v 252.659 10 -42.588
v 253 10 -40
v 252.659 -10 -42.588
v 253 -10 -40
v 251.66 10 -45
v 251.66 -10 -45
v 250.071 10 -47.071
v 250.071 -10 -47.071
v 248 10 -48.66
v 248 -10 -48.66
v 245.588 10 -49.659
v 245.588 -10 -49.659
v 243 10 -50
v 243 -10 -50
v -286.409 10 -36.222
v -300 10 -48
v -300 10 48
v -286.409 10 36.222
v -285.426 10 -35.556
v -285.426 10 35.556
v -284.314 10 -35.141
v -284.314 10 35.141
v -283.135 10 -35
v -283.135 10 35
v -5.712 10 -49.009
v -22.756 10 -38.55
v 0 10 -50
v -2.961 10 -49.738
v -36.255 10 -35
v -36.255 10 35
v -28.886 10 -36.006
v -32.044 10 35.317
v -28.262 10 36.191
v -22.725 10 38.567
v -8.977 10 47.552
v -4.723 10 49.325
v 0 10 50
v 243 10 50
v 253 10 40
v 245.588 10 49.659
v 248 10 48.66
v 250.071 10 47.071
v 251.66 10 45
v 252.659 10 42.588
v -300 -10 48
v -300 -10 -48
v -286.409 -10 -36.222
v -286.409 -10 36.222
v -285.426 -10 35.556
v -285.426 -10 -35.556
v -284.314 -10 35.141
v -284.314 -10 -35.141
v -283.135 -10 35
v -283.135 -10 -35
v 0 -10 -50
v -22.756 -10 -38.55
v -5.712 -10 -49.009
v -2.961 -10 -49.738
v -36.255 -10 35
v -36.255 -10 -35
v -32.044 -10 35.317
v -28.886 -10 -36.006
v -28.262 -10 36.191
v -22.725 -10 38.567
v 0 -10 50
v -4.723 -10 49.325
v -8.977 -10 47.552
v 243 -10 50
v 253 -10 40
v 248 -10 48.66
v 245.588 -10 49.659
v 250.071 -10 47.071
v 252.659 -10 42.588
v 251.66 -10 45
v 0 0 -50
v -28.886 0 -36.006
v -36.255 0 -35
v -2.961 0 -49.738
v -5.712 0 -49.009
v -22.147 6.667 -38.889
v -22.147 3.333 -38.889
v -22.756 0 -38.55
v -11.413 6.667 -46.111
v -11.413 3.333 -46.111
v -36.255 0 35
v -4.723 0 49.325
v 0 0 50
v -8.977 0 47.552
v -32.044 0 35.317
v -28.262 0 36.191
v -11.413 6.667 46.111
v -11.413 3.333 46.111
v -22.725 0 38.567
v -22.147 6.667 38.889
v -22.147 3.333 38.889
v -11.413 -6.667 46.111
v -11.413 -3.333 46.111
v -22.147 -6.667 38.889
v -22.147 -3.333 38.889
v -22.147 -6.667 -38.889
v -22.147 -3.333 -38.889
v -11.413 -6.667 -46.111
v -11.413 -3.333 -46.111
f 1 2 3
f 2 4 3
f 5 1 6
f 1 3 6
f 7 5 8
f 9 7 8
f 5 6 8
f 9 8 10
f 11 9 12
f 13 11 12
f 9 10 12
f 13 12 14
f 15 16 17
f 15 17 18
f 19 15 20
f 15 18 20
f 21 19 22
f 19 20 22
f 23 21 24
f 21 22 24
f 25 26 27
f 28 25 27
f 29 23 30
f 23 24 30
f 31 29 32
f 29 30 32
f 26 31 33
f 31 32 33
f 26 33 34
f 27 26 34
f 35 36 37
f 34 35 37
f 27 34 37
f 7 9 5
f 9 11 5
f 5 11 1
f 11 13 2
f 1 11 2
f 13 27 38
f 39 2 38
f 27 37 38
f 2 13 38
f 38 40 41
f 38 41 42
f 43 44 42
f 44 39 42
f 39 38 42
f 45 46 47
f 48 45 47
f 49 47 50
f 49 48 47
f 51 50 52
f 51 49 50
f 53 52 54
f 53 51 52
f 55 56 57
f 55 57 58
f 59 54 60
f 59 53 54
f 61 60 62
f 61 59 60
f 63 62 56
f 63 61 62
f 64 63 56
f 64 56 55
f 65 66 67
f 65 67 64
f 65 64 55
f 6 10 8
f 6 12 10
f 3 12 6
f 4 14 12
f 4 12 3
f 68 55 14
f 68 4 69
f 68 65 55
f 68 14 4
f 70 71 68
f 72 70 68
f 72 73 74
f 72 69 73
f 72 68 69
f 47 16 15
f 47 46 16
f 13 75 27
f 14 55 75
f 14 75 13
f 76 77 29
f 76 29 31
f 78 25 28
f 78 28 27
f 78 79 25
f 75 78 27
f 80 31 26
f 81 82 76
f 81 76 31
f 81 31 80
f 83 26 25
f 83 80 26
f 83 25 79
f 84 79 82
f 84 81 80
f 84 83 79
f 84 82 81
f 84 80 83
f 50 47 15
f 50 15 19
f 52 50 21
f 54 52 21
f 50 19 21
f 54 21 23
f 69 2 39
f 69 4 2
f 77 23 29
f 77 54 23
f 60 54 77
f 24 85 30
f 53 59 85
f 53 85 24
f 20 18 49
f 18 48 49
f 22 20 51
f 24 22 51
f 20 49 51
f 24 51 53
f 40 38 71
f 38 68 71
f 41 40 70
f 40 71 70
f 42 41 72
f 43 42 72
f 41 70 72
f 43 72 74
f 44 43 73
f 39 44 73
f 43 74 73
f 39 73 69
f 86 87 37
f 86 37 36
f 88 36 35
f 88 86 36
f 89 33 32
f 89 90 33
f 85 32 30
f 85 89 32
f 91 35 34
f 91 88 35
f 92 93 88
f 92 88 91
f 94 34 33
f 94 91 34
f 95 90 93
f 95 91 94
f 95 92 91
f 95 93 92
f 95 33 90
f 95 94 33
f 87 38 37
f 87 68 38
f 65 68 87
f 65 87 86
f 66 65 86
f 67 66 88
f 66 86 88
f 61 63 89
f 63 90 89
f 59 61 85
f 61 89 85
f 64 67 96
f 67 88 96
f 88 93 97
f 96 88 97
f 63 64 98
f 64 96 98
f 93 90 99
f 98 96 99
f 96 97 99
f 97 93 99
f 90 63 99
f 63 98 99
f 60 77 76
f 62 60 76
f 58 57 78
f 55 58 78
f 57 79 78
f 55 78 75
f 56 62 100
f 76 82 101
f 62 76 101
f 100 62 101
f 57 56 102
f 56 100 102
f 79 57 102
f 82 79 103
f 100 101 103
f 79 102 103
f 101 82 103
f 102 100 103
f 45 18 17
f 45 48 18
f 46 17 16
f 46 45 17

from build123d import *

# Parameters (mm, degrees)
F0_W     = 151.5346497297
F0_H     = 70
F1_DEPTH = 10
F2_R     = 10
F3_R     = 5
F4_R     = 5


with BuildPart() as f1:
    # F0 (on Front) → F1 (new body, symmetric)
    with BuildSketch(Plane.XZ):
        Polygon((-300, 48), (-300, 35), (-285, 35), align=None)
        Polygon((-285, 35), (-300, 35), (-300, -35), (-285, -35), (-36.2545801078, -35), (0, -35), (0, 35), (-36.2545801078, 35), align=None)
        Polygon((-285, -35), (-300, -35), (-300, -48), align=None)
        with BuildLine():
            add(Edge.make_bspline(
                [(0, 50), (-13.1023780133, 50), (-19.1101505149, 35), (-36.2545801078, 35)],
                knots=[0, 0, 0, 0, 39.2351192019, 39.2351192019, 39.2351192019, 39.2351192019], degree=3))
            Line((-36.2545801078, 35), (0, 35))
            Line((0, 35), (0, 50))
        make_face()
        Polygon((0, 50), (0, 35), (151.5346497297, 35), (151.5346497297, -35), (0, -35), (0, -50), (253, -50), (253, 50), align=None)
        with BuildLine():
            Line((0, -35), (-36.2545801078, -35))
            add(Edge.make_bspline(
                [(-36.2545801078, -35), (-19.1101505149, -35), (-13.1023780133, -50), (0, -50)],
                knots=[0, 0, 0, 0, 39.2351192019, 39.2351192019, 39.2351192019, 39.2351192019], degree=3))
            Line((0, -50), (0, -35))
        make_face()
        with Locations((75.7673248649, 0)):
            Rectangle(F0_W, F0_H)
    extrude(amount=F1_DEPTH, both=True)

    # F2
    f2_edges = [f1.edges().sort_by_distance(p)[0] for p in [
        (253, 0, 50),
        (253, 0, -50),
    ]]
    fillet(f2_edges, radius=F2_R)

    # F3
    f3_edges = [f1.edges().sort_by_distance(p)[0] for p in [
        (-285, 0, 35),
    ]]
    fillet(f3_edges, radius=F3_R)

    # F4
    f4_edges = [f1.edges().sort_by_distance(p)[0] for p in [
        (-285, 0, -35),
    ]]
    fillet(f4_edges, radius=F4_R)


solid = f1.part
